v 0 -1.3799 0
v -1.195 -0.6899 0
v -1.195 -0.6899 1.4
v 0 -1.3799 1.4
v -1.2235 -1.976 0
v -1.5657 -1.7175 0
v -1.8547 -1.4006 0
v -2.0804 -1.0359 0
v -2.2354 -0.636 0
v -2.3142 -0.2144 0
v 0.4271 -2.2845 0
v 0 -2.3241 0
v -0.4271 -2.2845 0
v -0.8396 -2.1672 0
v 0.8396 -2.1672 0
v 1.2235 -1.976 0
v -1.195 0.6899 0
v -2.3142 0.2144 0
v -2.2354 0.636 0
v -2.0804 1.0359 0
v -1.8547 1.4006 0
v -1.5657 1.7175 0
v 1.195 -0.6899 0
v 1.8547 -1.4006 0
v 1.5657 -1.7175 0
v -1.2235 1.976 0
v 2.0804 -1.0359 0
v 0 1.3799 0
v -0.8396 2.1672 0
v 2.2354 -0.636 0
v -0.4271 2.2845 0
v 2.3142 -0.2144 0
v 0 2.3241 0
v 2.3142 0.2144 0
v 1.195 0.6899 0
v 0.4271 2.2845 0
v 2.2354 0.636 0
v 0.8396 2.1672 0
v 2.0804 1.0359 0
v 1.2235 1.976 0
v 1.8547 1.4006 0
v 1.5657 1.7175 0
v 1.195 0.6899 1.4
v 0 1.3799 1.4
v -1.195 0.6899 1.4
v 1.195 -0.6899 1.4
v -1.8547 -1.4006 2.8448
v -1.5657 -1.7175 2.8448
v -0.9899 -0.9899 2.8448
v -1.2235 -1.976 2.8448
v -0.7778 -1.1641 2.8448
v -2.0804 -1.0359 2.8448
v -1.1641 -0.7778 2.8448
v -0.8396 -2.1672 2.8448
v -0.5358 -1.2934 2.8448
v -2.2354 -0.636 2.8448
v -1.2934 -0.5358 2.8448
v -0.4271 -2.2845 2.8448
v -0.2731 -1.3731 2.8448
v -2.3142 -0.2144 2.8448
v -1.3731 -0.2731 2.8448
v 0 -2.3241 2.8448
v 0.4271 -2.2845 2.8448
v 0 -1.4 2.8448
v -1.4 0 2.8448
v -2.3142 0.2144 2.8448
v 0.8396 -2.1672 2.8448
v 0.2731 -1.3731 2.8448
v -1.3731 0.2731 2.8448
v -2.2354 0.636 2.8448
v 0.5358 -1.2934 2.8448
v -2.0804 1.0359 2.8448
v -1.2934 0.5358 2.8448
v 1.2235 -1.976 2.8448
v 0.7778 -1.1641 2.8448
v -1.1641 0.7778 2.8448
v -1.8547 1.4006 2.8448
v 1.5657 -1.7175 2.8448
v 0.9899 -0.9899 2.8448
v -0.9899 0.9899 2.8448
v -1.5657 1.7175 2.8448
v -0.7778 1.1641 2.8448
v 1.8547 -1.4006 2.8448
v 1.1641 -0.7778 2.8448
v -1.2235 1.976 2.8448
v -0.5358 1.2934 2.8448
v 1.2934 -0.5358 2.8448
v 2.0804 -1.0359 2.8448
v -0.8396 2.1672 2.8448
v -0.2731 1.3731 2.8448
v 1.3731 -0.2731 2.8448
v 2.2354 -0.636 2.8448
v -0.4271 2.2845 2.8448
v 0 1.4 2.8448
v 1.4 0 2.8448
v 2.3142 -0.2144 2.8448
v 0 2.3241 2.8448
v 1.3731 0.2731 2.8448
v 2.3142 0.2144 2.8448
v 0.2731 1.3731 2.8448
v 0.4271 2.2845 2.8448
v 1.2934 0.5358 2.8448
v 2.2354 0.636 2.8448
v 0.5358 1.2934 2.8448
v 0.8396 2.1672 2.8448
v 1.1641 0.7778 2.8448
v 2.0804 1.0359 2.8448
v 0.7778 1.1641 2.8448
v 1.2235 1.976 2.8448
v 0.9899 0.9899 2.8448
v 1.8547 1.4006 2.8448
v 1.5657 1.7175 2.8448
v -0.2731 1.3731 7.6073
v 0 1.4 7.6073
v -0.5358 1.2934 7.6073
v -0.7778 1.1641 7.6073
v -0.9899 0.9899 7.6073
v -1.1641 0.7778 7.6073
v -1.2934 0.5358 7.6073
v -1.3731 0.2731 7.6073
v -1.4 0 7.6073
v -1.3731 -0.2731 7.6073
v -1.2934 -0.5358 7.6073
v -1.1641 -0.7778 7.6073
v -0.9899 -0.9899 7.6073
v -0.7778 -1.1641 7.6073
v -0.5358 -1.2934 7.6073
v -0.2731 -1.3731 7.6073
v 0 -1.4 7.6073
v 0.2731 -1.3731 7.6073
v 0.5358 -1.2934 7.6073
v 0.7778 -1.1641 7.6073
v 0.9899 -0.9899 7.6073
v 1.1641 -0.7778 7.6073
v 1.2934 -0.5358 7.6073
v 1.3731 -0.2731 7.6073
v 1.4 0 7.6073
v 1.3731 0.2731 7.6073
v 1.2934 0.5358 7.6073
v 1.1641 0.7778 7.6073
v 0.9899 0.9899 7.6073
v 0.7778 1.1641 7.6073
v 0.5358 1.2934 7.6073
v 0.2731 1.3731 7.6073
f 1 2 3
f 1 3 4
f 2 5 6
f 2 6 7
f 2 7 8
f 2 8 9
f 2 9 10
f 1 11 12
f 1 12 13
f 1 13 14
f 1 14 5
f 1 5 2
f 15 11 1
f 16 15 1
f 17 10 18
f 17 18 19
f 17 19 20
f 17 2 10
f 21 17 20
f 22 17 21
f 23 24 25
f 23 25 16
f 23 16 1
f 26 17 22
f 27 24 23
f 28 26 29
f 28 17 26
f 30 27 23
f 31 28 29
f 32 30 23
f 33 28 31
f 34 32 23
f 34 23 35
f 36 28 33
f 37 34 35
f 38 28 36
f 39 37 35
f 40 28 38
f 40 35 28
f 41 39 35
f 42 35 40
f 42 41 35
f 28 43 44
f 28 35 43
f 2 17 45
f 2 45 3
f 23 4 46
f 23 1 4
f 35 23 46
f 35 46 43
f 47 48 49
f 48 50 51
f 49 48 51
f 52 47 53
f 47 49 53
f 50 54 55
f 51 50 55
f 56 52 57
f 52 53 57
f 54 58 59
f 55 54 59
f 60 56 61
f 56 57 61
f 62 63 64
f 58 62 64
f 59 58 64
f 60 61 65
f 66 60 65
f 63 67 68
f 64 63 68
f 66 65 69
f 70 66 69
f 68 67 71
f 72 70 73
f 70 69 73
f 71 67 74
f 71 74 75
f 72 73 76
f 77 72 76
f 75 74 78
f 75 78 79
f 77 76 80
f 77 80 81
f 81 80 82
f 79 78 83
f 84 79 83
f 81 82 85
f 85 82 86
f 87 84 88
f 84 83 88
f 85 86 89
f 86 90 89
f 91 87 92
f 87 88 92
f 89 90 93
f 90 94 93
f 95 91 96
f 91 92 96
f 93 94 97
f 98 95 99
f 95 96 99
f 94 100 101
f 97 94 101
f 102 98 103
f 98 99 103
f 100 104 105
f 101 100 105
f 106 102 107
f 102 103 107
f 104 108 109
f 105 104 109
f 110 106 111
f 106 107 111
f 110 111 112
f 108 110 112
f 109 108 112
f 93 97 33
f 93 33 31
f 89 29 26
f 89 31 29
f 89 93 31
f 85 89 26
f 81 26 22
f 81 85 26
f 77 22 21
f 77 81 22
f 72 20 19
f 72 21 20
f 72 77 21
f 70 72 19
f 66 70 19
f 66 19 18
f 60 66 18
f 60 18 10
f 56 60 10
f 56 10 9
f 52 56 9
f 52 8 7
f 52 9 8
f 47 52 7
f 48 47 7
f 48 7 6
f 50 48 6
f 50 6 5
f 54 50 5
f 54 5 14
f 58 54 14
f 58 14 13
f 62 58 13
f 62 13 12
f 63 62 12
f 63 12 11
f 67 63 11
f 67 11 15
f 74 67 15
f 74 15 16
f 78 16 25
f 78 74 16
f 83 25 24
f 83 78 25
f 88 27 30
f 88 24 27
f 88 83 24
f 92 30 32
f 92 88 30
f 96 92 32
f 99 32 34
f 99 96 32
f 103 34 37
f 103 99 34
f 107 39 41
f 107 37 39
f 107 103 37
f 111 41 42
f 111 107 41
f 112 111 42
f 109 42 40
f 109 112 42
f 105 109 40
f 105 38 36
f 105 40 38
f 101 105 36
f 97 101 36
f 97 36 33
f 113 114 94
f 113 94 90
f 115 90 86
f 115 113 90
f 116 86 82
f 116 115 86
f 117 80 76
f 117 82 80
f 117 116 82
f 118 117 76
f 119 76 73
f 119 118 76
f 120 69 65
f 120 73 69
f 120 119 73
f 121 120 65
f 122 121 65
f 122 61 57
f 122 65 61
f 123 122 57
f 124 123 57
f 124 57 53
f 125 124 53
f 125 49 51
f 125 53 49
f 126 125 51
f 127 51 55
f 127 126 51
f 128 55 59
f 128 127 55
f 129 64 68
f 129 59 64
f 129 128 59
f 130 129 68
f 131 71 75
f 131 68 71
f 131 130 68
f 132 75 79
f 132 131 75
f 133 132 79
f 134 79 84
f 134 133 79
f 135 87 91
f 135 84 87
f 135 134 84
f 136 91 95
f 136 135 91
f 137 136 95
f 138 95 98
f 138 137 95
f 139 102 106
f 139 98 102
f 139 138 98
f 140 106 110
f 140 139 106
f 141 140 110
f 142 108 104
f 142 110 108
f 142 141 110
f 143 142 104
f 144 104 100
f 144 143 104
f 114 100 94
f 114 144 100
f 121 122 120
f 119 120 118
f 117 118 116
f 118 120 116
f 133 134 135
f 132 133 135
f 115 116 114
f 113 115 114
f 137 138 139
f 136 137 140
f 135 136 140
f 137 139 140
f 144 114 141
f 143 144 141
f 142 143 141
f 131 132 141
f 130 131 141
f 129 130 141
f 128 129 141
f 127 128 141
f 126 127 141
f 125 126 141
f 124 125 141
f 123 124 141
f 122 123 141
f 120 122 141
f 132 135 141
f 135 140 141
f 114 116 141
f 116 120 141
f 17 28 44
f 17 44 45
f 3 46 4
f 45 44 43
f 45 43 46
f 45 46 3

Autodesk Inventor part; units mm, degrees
ref_plane "YZ Plane" through (0, 0, 0) normal (1, 0, 0) x (0, 1, 0)
ref_plane "XZ Plane" through (0, 0, 0) normal (0, 1, 0) x (-1, 0, 0)
ref_plane "XY Plane" through (0, 0, 0) normal (0, 0, 1) x (1, 0, 0)
sketch "スケッチ1" plane through (0, 0, 0) normal (1, 0, 0) x (0, 1, 0)
  line L0 (0, 7.6073) -> (0, 0)
  line L1 (0, 0) -> (2.3241, 0)
  line L2 (2.3241, 0) -> (2.3241, 2.8448)
  line L3 (2.3241, 2.8448) -> (1.4, 2.8448)
  line L4 (1.4, 2.8448) -> (1.4, 7.6073)
  line L5 (1.4, 7.6073) -> (0, 7.6073)
  dimension "d1" = 1.4
  dimension "d2" = 2.8448
  dimension "d3" = 2.3241
  dimension "d10" = 4.7625
revolve "回転1" add sketch "スケッチ1" angle 360 about axis through (0, 0, 7.6073) along (0, 0, -1)
sketch "スケッチ2" plane through (0, 0, 0) normal (0, 0, -1) x (-1, 0, 0)
  line L0 (0, 1.3799) -> (1.195, 0.6899)
  line L1 (1.195, 0.6899) -> (1.195, -0.6899)
  line L2 (1.195, -0.6899) -> (0, -1.3799)
  line L3 (0, -1.3799) -> (-1.195, -0.6899)
  line L4 (-1.195, -0.6899) -> (-1.195, 0.6899)
  line L5 (-1.195, 0.6899) -> (0, 1.3799)
  circle A0 centre (0, 0) radius 2.3241 projected
  line L6 (0, 2.3241) -> (0, -2.3241) construction
  point P0 (0, 0)
  dimension "d7" = 2.39
extrude "押し出し1" cut sketch "スケッチ2" against normal blind 1.4 contours L0 L1 L2 L3 L4 L5
thread "ねじ1" size "4-40 UNC" class "2A" standard "ANSI Unified Screw Threads" full length
properties part number "No4_40-3-16" material "ステンレス鋼 AISI 304"
